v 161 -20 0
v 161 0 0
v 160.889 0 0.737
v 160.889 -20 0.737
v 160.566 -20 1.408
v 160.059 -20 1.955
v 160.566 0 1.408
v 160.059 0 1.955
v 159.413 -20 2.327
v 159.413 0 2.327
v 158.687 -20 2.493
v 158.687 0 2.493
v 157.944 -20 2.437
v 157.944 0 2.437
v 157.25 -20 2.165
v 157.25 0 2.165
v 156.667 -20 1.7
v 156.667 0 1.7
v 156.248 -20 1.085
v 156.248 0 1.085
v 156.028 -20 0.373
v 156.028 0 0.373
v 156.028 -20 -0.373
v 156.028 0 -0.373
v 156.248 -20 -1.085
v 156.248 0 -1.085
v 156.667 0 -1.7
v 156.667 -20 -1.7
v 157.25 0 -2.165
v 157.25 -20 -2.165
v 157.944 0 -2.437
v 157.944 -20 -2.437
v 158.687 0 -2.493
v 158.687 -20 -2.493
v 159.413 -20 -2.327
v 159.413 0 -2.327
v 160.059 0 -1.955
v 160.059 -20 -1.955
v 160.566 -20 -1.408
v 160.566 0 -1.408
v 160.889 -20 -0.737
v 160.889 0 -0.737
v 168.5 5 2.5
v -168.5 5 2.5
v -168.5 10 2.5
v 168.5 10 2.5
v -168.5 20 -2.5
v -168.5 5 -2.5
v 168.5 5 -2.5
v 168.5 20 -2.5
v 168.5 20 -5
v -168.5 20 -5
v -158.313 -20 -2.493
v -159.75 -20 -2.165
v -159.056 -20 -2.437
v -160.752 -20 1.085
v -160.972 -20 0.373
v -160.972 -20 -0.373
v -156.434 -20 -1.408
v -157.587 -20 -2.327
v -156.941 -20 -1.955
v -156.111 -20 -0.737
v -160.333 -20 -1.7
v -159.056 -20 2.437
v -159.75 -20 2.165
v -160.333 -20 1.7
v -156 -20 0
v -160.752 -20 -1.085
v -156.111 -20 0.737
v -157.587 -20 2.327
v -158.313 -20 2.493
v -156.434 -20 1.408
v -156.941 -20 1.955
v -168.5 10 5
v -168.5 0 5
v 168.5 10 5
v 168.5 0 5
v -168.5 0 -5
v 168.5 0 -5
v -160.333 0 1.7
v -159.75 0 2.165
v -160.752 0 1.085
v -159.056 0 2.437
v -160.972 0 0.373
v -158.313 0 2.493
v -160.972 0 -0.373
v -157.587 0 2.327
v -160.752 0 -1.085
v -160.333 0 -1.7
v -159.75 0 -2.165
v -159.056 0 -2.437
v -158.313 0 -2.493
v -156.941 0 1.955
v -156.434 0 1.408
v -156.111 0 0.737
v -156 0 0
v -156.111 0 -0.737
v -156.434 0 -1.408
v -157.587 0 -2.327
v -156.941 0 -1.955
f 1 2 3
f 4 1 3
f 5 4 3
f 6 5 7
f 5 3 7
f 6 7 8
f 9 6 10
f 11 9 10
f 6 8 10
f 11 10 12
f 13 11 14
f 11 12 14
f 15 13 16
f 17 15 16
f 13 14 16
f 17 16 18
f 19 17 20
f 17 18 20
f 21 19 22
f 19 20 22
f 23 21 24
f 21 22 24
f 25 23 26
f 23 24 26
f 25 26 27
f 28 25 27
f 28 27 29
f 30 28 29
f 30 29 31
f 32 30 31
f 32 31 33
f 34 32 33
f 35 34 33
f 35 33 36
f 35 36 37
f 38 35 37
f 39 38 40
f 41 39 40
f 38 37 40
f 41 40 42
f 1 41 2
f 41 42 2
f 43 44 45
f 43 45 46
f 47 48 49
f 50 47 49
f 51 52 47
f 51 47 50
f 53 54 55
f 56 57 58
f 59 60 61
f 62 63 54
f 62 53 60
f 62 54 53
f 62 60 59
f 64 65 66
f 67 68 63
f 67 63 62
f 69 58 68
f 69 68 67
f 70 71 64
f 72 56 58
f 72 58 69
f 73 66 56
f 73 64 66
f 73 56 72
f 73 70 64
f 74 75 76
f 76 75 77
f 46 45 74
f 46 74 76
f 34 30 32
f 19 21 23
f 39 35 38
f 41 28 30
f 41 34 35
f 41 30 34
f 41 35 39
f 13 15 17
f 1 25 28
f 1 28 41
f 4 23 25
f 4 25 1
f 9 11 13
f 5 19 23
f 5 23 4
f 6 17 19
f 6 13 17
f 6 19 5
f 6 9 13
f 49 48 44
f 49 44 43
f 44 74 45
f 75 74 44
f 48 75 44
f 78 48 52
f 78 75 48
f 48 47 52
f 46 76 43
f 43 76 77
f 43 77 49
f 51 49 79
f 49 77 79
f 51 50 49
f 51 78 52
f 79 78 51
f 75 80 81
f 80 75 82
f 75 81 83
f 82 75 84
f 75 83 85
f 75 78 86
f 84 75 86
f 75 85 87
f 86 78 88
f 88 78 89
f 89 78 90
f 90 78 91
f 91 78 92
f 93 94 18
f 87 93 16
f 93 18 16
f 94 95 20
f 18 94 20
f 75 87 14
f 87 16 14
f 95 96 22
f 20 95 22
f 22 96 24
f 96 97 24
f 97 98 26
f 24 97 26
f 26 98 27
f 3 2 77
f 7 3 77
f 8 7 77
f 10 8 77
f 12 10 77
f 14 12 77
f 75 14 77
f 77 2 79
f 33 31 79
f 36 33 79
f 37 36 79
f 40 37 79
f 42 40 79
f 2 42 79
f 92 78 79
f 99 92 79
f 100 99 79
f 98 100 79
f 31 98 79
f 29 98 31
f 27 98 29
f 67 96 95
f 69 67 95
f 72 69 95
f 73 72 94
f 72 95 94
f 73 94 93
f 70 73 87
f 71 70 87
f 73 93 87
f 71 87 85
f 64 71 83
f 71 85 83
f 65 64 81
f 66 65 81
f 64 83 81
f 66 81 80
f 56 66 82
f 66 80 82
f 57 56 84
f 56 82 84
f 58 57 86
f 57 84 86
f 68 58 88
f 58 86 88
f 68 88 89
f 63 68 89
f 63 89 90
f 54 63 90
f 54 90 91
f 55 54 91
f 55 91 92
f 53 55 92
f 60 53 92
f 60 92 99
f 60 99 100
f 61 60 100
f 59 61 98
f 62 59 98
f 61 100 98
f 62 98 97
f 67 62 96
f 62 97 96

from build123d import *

# Parameters (mm, degrees)
SKETCH1_W           = 337
SKETCH1_H           = 10
BOSS_EXTRUDE1_DEPTH = 5
SKETCH2_W           = 337
SKETCH2_H           = 2.5
BOSS_EXTRUDE2_DEPTH = 5
SKETCH3_W           = 337
SKETCH3_H           = 2.5
BOSS_EXTRUDE3_DEPTH = 15
SKETCH4_R           = 2.5
BOSS_EXTRUDE4_DEPTH = 20


with BuildPart() as part:
    # Sketch1 → Boss-Extrude1 (new body)
    with BuildSketch(Plane(origin=(0, 0, 0), x_dir=(1, 0, 0), z_dir=(0, 1, 0))):
        Rectangle(SKETCH1_W, SKETCH1_H)
    extrude(amount=BOSS_EXTRUDE1_DEPTH)

    # Sketch2 → Boss-Extrude2 (add)
    with BuildSketch(Plane(origin=(0, 5, 0), x_dir=(1, 0, 0), z_dir=(0, 1, 0))):
        with Locations((0, -3.75)):
            Rectangle(SKETCH2_W, SKETCH2_H)
    extrude(amount=BOSS_EXTRUDE2_DEPTH)

    # Sketch3 → Boss-Extrude3 (add)
    with BuildSketch(Plane(origin=(0, 5, 0), x_dir=(1, 0, 0), z_dir=(0, 1, 0))):
        with Locations((0, 3.75)):
            Rectangle(SKETCH3_W, SKETCH3_H)
    extrude(amount=BOSS_EXTRUDE3_DEPTH)

    # Sketch4 → Boss-Extrude4 (add)
    with BuildSketch(Plane.XZ):
        with Locations((-158.5, 0)):
            Circle(SKETCH4_R)
        with Locations((158.5, 0)):
            Circle(SKETCH4_R)
    extrude(amount=BOSS_EXTRUDE4_DEPTH)


solid = part.part
